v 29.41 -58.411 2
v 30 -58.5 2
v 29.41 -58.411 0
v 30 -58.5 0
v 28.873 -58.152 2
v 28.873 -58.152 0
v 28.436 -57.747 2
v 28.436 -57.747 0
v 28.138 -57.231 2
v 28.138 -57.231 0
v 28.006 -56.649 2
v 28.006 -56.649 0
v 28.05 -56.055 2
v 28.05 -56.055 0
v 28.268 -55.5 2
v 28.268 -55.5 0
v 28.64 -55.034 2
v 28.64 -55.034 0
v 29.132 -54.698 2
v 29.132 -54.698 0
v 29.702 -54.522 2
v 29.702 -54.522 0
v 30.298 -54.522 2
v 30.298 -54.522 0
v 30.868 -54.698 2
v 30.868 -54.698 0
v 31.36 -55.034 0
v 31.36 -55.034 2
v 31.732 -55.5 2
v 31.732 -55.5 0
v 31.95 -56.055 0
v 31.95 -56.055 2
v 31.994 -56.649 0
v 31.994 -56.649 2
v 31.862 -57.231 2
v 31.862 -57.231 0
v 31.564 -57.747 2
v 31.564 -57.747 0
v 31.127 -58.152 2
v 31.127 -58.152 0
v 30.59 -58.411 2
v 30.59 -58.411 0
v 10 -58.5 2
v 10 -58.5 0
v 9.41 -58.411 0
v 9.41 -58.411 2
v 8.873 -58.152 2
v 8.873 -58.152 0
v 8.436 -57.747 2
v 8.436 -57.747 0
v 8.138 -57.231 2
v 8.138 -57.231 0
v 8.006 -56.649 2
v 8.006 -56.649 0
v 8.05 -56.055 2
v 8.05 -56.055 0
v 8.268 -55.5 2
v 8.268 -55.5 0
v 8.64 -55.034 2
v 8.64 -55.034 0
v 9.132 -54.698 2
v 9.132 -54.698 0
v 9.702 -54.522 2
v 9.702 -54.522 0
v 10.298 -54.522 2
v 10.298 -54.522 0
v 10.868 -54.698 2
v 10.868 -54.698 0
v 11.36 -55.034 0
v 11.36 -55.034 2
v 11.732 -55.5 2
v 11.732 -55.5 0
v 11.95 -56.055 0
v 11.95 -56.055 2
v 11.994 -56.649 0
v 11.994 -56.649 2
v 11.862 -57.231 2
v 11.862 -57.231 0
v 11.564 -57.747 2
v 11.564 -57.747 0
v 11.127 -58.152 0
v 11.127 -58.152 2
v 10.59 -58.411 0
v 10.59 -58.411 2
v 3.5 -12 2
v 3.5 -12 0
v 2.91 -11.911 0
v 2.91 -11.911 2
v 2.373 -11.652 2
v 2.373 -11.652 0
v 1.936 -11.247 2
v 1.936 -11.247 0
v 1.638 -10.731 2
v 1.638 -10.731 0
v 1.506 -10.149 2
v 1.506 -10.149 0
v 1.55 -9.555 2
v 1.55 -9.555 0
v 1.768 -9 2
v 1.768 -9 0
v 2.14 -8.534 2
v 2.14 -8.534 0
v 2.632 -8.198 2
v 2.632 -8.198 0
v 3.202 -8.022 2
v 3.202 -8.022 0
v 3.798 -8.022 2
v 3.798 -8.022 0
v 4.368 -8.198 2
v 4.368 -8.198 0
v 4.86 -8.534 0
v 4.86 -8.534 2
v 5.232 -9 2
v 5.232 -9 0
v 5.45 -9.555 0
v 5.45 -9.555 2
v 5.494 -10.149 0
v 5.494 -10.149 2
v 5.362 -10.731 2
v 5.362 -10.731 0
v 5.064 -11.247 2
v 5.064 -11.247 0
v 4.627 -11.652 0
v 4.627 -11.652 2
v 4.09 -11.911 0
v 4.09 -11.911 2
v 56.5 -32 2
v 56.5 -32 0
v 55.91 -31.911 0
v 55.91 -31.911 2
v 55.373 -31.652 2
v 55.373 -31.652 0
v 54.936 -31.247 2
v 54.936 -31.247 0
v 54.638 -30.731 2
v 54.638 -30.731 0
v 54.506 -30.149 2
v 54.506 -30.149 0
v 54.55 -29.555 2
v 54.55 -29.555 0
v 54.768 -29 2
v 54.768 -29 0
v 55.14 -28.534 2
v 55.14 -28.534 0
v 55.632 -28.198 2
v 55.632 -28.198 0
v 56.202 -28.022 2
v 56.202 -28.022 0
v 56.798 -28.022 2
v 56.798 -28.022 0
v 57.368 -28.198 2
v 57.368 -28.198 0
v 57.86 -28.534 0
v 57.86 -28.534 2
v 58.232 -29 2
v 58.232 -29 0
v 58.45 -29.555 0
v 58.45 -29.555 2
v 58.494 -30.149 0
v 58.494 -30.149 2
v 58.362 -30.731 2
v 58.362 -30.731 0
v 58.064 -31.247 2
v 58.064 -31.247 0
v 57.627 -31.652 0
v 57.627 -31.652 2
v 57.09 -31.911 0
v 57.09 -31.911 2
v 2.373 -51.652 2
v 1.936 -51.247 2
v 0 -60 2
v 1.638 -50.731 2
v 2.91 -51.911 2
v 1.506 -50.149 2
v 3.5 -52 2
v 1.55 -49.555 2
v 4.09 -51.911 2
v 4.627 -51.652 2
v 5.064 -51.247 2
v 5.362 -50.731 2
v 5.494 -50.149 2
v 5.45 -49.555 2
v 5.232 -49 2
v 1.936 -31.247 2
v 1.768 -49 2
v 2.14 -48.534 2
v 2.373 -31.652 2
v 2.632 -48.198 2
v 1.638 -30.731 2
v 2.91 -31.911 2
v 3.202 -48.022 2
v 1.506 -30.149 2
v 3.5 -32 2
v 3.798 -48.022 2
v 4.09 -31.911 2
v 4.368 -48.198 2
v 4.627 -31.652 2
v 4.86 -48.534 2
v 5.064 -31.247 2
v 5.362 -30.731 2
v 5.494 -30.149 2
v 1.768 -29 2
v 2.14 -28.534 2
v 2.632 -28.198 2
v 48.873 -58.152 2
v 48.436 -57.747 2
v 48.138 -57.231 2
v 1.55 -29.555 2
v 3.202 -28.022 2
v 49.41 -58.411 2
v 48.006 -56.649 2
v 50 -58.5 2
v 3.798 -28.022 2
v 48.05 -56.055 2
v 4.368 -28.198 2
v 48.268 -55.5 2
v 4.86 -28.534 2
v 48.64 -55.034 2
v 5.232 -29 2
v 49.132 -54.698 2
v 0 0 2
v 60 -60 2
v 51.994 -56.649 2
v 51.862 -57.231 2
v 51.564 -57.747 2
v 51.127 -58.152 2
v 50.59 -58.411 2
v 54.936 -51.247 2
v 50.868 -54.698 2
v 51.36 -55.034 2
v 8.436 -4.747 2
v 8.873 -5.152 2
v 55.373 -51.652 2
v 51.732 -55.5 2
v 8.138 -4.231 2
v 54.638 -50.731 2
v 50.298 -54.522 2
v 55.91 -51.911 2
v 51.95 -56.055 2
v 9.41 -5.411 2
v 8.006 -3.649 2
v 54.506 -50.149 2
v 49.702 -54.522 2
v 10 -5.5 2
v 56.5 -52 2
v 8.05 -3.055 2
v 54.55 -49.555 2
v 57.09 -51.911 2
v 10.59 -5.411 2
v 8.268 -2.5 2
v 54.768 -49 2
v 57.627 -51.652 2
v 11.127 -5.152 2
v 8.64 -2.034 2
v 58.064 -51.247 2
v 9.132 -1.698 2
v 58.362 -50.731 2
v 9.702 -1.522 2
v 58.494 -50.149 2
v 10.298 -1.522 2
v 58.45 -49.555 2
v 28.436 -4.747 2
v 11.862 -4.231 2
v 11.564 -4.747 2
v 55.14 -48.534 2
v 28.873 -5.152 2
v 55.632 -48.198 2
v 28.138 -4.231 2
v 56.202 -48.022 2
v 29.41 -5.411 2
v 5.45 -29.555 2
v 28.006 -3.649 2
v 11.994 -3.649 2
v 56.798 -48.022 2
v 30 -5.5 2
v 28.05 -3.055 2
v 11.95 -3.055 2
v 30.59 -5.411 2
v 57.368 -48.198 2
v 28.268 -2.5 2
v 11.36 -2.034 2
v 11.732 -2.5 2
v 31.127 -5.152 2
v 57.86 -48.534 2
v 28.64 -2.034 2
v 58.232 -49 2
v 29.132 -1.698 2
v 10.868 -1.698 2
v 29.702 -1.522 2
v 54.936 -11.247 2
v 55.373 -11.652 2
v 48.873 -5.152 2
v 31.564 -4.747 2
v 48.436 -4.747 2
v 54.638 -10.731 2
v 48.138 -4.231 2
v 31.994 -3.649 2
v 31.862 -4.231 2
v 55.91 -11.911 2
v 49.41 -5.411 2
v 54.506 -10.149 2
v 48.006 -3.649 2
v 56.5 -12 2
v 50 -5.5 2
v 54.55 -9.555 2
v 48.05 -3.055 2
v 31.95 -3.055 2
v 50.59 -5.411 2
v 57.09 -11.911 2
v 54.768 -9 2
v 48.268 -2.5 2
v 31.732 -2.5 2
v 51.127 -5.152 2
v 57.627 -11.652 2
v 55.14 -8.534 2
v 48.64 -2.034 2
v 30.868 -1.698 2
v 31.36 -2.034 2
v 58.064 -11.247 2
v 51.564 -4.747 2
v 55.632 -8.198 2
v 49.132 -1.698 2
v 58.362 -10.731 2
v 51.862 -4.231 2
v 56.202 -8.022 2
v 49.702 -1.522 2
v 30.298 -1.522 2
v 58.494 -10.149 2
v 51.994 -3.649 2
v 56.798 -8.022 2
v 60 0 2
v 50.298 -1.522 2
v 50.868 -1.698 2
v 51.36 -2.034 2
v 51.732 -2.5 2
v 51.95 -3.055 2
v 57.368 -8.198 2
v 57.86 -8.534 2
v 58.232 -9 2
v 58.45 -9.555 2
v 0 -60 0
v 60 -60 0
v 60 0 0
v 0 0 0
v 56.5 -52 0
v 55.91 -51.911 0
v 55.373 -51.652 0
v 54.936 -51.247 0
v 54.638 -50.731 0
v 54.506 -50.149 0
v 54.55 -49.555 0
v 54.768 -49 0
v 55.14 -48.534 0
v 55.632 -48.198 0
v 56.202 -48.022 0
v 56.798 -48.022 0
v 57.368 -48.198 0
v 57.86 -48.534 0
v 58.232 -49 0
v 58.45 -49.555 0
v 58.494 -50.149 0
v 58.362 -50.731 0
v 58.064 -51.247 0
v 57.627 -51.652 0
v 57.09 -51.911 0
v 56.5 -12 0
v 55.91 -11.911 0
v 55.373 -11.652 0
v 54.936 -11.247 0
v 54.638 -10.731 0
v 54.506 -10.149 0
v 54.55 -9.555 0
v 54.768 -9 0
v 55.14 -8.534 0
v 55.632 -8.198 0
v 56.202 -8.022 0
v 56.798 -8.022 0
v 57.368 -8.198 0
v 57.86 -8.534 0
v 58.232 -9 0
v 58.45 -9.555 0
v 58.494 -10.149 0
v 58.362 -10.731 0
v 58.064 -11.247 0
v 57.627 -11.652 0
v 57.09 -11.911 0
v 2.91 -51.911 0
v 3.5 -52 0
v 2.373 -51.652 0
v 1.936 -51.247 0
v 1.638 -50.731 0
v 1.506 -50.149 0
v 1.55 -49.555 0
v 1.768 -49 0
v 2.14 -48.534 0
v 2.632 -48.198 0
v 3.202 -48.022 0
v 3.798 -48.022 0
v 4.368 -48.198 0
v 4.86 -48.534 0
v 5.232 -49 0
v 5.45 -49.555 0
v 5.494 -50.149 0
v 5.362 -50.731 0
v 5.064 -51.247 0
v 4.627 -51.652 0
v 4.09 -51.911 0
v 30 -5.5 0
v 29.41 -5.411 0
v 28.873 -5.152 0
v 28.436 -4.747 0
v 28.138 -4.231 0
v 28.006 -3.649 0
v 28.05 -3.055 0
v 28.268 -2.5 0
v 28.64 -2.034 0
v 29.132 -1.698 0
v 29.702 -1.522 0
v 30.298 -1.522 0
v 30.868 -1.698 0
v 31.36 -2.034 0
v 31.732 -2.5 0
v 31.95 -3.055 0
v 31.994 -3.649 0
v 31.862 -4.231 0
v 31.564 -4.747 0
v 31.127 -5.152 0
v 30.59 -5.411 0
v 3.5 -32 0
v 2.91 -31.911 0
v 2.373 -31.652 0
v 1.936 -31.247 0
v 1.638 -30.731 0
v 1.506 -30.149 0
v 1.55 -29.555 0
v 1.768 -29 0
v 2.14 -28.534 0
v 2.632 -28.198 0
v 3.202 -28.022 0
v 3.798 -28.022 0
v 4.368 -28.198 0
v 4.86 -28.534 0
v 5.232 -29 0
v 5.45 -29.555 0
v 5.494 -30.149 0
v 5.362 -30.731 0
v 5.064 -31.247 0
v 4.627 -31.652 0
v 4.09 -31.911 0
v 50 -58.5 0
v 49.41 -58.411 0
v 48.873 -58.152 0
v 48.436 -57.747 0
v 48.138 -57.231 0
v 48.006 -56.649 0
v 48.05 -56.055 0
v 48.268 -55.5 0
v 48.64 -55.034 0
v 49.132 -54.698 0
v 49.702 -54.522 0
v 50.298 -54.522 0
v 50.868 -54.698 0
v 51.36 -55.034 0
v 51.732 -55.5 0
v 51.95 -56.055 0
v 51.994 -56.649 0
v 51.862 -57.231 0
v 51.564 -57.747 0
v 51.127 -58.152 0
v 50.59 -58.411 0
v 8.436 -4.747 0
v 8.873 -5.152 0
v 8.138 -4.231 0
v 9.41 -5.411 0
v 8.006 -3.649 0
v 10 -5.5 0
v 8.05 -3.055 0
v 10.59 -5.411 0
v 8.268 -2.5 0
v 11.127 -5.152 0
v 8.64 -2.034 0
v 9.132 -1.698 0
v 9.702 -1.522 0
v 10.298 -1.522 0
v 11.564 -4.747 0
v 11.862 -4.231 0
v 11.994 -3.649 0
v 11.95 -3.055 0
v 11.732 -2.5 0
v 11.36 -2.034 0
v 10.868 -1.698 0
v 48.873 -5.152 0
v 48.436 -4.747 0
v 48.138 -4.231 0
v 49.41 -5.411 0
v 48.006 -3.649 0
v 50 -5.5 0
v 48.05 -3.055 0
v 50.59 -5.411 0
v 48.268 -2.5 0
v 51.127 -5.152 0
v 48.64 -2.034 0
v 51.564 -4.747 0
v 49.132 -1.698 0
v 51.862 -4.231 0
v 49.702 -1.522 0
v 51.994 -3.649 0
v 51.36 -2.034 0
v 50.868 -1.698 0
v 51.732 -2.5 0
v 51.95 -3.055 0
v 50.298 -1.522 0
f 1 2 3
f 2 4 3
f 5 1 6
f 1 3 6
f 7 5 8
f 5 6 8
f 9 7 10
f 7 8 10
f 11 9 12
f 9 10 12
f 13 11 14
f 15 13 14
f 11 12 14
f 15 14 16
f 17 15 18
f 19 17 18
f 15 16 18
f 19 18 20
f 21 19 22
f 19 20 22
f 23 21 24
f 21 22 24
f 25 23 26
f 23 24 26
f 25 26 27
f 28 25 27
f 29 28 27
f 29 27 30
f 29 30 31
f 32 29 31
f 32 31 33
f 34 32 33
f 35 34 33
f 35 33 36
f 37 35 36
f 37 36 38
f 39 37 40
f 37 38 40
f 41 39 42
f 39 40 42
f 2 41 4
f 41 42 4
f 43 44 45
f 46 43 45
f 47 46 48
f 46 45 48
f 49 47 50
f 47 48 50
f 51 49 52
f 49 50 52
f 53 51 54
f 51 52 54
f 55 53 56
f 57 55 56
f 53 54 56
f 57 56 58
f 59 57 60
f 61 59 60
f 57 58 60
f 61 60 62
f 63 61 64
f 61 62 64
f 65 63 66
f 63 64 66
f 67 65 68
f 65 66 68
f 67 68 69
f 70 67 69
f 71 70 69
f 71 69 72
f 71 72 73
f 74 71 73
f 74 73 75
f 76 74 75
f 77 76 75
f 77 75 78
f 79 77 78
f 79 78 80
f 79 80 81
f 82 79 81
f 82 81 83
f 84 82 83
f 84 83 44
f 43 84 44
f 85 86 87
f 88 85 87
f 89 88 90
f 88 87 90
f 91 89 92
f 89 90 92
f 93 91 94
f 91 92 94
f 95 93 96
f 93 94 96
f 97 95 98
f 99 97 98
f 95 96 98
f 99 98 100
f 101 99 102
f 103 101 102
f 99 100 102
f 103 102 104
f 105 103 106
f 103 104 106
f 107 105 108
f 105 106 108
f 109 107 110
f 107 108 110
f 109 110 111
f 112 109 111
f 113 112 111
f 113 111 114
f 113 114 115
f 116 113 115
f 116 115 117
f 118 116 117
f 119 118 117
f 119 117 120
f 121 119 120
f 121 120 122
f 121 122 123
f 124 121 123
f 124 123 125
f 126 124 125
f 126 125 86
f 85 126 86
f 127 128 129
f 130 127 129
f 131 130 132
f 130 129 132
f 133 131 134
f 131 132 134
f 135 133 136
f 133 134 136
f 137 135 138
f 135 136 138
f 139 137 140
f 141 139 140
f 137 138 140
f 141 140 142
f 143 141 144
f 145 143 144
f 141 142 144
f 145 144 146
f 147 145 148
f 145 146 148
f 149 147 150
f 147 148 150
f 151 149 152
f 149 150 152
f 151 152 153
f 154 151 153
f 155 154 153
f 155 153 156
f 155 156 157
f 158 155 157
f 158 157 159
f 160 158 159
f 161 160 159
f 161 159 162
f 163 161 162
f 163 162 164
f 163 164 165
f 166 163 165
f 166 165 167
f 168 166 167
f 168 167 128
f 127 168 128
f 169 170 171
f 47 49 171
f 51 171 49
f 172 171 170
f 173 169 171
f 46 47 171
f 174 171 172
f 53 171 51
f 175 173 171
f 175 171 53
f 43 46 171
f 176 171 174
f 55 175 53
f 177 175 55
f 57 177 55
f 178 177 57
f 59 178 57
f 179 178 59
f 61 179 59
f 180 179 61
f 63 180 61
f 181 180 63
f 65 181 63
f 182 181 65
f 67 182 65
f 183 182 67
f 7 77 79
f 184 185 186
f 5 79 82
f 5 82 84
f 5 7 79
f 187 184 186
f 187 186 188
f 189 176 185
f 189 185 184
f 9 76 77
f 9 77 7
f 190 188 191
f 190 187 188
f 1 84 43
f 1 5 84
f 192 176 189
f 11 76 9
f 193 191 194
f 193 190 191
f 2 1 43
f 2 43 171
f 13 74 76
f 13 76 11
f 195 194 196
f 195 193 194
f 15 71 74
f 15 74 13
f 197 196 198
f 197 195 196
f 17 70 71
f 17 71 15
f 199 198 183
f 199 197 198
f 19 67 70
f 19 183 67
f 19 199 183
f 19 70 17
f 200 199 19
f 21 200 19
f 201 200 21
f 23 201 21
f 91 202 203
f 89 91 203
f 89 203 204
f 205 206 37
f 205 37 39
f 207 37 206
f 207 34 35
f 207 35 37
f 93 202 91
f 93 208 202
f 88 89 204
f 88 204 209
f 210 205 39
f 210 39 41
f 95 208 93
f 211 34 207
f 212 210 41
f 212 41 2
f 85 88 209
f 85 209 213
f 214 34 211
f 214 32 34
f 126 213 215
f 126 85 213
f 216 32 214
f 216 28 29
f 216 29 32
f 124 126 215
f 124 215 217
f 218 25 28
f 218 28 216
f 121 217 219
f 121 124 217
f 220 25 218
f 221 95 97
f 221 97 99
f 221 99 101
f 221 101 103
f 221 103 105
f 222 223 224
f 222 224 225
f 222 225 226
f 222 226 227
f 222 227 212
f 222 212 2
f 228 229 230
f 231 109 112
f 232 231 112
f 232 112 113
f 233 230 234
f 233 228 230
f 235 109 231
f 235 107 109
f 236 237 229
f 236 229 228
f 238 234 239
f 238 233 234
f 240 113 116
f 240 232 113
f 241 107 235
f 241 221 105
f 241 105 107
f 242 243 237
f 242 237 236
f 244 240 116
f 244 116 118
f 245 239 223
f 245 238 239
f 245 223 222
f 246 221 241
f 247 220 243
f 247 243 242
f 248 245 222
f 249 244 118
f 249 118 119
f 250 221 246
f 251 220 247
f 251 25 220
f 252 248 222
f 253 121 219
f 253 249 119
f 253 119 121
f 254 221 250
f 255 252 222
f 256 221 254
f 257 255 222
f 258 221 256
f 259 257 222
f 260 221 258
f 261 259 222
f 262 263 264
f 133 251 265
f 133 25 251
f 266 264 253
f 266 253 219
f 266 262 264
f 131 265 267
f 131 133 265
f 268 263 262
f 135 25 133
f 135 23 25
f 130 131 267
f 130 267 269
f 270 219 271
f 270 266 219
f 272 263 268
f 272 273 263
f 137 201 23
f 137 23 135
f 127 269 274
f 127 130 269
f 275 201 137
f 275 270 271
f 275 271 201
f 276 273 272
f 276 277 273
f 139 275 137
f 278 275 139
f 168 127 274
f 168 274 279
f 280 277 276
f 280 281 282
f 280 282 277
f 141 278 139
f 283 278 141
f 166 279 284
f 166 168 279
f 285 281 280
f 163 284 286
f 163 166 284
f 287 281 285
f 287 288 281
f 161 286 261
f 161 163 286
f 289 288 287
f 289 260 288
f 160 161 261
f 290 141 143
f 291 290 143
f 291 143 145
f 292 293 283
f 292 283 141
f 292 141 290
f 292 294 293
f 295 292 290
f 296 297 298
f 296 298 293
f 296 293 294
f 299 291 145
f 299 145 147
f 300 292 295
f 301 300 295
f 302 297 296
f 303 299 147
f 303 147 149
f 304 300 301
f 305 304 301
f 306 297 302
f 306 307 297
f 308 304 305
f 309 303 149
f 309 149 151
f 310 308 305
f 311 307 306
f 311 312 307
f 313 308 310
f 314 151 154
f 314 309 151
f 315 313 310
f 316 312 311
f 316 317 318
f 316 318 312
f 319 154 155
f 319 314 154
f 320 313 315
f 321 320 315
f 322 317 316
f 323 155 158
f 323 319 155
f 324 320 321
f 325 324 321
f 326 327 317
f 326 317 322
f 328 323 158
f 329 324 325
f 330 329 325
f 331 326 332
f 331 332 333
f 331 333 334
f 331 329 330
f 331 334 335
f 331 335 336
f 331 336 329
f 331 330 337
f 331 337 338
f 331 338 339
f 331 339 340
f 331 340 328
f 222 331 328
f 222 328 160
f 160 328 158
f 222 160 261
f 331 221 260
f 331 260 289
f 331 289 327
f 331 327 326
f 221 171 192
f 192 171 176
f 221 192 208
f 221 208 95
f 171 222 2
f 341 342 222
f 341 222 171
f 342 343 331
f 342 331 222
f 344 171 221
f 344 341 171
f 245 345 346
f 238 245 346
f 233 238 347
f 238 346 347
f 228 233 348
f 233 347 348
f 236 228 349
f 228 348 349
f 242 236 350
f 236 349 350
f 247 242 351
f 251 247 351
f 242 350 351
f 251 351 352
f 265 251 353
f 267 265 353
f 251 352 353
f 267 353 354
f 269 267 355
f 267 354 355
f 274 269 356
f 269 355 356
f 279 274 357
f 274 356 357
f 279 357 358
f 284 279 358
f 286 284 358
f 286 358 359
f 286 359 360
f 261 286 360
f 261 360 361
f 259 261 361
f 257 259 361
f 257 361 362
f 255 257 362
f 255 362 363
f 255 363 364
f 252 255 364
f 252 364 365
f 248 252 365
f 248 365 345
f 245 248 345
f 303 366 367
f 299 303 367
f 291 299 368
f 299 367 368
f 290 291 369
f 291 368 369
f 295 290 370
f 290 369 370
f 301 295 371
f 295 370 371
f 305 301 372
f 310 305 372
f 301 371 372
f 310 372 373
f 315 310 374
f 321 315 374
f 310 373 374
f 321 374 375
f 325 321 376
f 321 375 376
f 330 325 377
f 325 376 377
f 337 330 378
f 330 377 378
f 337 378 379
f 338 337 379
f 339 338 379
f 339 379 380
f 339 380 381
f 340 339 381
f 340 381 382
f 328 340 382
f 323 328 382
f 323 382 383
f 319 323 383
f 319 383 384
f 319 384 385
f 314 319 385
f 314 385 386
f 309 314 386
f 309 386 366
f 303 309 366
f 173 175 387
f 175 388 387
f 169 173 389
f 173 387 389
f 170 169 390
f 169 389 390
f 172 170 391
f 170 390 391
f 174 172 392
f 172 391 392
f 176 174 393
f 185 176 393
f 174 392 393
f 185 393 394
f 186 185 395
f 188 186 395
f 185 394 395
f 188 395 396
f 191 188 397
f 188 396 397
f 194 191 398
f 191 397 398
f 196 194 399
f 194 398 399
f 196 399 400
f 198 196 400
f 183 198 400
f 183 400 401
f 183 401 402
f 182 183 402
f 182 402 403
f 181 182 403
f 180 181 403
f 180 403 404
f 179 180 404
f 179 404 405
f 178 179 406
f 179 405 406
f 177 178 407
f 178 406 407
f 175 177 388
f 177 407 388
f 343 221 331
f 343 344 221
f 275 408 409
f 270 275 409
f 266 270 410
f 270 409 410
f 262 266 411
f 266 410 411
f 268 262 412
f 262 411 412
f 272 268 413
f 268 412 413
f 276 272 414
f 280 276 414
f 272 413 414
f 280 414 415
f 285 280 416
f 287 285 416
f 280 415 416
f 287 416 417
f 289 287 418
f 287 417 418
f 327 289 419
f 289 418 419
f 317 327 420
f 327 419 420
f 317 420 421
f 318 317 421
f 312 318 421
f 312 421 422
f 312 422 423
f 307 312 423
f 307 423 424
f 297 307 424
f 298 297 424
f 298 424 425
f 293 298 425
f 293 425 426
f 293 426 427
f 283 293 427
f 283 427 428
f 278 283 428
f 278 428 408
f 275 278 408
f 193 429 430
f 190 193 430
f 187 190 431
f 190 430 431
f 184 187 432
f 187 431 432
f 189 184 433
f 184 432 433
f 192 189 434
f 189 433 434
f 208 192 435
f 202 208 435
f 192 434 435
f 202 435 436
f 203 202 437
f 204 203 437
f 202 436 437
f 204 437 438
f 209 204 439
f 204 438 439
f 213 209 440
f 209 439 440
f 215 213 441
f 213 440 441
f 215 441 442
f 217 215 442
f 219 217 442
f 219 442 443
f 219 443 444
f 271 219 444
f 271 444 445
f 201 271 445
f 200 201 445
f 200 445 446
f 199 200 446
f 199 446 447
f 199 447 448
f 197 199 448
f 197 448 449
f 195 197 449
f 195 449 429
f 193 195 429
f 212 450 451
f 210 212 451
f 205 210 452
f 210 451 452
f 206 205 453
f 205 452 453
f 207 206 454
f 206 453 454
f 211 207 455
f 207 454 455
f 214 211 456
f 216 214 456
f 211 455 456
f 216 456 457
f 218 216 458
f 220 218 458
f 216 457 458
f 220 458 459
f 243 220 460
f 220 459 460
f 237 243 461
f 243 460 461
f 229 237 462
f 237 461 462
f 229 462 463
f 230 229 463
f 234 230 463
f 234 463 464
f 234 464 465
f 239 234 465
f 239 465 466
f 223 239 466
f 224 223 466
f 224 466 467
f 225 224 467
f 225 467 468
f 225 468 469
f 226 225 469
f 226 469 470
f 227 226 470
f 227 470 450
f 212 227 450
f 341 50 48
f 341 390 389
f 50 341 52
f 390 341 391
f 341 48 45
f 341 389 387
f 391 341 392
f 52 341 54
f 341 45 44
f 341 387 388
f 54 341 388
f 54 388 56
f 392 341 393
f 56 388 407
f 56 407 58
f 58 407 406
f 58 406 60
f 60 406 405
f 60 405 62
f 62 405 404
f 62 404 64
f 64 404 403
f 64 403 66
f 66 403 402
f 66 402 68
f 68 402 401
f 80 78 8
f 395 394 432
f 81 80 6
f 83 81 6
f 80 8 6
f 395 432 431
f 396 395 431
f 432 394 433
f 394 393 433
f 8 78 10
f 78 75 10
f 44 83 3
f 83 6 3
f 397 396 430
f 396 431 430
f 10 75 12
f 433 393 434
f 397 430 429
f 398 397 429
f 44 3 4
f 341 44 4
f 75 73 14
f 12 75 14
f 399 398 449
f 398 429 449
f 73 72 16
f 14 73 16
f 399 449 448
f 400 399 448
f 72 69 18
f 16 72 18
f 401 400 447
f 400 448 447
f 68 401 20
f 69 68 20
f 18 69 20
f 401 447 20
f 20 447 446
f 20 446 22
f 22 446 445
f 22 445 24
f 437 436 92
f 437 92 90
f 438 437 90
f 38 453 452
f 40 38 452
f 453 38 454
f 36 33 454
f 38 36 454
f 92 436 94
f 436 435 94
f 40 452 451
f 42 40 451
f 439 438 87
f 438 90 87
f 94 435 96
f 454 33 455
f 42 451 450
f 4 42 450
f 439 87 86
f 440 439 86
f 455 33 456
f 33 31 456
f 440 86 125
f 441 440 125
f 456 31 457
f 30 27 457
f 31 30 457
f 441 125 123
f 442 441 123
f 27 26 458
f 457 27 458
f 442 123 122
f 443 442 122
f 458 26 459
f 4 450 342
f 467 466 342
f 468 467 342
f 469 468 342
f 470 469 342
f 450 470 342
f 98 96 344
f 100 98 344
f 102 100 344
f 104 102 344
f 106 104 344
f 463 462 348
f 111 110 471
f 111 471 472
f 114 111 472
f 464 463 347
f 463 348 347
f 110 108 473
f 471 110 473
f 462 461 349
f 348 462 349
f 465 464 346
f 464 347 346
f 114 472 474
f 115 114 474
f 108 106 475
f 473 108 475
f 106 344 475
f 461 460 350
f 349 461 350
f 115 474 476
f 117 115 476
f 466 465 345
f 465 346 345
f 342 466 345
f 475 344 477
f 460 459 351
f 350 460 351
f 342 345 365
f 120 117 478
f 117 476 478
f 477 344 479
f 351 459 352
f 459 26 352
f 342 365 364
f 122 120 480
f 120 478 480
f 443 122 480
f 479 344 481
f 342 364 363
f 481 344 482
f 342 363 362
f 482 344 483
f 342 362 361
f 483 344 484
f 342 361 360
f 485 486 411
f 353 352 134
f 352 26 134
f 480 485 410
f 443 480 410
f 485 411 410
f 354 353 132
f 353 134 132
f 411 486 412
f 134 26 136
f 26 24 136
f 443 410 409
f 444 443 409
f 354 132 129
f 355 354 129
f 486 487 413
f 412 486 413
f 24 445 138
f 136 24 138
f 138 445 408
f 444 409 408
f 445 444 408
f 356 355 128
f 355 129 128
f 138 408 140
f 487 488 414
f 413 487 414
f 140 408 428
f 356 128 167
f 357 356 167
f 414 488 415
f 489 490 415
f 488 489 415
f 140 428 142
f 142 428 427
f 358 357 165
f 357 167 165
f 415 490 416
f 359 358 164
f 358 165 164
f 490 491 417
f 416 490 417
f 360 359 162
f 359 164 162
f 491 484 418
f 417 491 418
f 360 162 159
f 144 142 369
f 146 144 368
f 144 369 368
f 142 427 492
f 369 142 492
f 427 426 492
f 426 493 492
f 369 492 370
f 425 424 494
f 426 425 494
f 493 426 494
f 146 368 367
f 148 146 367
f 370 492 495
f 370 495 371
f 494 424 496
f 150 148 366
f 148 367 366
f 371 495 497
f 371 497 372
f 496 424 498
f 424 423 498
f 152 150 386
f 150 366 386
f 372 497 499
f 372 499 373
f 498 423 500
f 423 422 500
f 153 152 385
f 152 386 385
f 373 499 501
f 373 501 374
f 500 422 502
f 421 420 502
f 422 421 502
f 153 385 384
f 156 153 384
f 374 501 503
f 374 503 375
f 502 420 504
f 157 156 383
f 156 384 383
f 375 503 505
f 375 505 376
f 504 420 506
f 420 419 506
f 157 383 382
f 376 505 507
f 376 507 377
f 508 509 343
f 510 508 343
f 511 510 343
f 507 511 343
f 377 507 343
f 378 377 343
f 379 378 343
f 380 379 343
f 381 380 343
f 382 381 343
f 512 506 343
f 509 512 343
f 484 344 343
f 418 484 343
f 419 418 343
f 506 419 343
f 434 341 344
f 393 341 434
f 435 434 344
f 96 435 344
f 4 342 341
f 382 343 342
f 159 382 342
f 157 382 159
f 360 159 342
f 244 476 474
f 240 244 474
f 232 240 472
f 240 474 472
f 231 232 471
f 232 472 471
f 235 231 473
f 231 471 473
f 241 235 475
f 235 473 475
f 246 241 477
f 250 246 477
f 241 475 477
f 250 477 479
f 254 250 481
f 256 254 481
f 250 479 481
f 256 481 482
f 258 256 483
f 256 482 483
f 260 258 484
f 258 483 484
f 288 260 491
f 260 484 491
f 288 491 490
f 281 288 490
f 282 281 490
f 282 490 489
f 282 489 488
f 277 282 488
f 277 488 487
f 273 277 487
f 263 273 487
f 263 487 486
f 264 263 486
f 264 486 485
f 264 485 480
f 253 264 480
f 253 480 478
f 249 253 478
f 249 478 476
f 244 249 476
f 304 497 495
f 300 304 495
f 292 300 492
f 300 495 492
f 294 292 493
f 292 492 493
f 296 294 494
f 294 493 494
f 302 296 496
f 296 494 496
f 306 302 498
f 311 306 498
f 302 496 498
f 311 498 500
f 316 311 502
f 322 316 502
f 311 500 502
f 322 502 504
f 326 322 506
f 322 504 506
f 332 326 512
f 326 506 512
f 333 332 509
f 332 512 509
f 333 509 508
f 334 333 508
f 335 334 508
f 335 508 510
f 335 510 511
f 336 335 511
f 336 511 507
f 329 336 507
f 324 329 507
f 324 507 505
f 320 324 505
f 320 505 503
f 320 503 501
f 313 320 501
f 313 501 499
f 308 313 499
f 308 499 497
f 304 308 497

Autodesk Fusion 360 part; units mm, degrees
sketch "Sketch1" plane through (0, 0, 0) normal (0, 0, 1) x (1, 0, 0)
  line L0 (0, 0) -> (60, 0)
  line L1 (60, 0) -> (60, -60)
  line L2 (60, -60) -> (0, -60)
  line L3 (0, -60) -> (0, 0)
  dimension "d1" = 60
  dimension "d2" = 60
extrude "Extrude1" add sketch "Sketch1" along normal blind 2
sketch "Sketch2" plane through (0, 0, 2) normal (0, 0, 1) x (-1, 0, 0)
  line L0 (0, 60) -> (-60, 60)
  line L1 (-60, 60) -> (-60, 0)
  line L2 (-60, 0) -> (0, 0)
  line L3 (0, 0) -> (0, 60)
  line L4 (-60, 10) -> (-56.5, 10)
  line L5 (-60, 3.5) -> (-50, 3.5)
  line L6 (-30, 0) -> (-30, 60)
  line L7 (0, 30) -> (-60, 30)
  line L8 (-30, 0) -> (-30, 3.5)
  line L9 (0, 30) -> (-3.5, 30)
  line L10 (-60, 30) -> (-56.5, 30)
  point P0 (-10, 3.5)
  point P1 (-3.5, 10)
  point P2 (-3.5, 50)
  point P3 (-10, 56.5)
  point P4 (-50, 56.5)
  point P5 (-56.5, 50)
  point P6 (-30, 56.5)
  dimension "d5" = 3.5
  dimension "d6" = 10
  dimension "d7" = 10
  dimension "d8" = 3.5
  dimension "d9" = 3.5
  dimension "d10" = 3.5
  dimension "d11" = 3.5
hole "Hole1" at (10, -3.5, 2) at (3.5, -10, 2) at (3.5, -30, 2) at (3.5, -50, 2) at (10, -56.5, 2) at (30, -56.5, 2) at (50, -56.5, 2) at (56.5, -50, 2) at (56.5, -30, 2) at (56.5, -10, 2) at (50, -3.5, 2) at (30, -3.5, 2) direction (0, 0, -1) diameter 4 depth 50 tip angle 180
